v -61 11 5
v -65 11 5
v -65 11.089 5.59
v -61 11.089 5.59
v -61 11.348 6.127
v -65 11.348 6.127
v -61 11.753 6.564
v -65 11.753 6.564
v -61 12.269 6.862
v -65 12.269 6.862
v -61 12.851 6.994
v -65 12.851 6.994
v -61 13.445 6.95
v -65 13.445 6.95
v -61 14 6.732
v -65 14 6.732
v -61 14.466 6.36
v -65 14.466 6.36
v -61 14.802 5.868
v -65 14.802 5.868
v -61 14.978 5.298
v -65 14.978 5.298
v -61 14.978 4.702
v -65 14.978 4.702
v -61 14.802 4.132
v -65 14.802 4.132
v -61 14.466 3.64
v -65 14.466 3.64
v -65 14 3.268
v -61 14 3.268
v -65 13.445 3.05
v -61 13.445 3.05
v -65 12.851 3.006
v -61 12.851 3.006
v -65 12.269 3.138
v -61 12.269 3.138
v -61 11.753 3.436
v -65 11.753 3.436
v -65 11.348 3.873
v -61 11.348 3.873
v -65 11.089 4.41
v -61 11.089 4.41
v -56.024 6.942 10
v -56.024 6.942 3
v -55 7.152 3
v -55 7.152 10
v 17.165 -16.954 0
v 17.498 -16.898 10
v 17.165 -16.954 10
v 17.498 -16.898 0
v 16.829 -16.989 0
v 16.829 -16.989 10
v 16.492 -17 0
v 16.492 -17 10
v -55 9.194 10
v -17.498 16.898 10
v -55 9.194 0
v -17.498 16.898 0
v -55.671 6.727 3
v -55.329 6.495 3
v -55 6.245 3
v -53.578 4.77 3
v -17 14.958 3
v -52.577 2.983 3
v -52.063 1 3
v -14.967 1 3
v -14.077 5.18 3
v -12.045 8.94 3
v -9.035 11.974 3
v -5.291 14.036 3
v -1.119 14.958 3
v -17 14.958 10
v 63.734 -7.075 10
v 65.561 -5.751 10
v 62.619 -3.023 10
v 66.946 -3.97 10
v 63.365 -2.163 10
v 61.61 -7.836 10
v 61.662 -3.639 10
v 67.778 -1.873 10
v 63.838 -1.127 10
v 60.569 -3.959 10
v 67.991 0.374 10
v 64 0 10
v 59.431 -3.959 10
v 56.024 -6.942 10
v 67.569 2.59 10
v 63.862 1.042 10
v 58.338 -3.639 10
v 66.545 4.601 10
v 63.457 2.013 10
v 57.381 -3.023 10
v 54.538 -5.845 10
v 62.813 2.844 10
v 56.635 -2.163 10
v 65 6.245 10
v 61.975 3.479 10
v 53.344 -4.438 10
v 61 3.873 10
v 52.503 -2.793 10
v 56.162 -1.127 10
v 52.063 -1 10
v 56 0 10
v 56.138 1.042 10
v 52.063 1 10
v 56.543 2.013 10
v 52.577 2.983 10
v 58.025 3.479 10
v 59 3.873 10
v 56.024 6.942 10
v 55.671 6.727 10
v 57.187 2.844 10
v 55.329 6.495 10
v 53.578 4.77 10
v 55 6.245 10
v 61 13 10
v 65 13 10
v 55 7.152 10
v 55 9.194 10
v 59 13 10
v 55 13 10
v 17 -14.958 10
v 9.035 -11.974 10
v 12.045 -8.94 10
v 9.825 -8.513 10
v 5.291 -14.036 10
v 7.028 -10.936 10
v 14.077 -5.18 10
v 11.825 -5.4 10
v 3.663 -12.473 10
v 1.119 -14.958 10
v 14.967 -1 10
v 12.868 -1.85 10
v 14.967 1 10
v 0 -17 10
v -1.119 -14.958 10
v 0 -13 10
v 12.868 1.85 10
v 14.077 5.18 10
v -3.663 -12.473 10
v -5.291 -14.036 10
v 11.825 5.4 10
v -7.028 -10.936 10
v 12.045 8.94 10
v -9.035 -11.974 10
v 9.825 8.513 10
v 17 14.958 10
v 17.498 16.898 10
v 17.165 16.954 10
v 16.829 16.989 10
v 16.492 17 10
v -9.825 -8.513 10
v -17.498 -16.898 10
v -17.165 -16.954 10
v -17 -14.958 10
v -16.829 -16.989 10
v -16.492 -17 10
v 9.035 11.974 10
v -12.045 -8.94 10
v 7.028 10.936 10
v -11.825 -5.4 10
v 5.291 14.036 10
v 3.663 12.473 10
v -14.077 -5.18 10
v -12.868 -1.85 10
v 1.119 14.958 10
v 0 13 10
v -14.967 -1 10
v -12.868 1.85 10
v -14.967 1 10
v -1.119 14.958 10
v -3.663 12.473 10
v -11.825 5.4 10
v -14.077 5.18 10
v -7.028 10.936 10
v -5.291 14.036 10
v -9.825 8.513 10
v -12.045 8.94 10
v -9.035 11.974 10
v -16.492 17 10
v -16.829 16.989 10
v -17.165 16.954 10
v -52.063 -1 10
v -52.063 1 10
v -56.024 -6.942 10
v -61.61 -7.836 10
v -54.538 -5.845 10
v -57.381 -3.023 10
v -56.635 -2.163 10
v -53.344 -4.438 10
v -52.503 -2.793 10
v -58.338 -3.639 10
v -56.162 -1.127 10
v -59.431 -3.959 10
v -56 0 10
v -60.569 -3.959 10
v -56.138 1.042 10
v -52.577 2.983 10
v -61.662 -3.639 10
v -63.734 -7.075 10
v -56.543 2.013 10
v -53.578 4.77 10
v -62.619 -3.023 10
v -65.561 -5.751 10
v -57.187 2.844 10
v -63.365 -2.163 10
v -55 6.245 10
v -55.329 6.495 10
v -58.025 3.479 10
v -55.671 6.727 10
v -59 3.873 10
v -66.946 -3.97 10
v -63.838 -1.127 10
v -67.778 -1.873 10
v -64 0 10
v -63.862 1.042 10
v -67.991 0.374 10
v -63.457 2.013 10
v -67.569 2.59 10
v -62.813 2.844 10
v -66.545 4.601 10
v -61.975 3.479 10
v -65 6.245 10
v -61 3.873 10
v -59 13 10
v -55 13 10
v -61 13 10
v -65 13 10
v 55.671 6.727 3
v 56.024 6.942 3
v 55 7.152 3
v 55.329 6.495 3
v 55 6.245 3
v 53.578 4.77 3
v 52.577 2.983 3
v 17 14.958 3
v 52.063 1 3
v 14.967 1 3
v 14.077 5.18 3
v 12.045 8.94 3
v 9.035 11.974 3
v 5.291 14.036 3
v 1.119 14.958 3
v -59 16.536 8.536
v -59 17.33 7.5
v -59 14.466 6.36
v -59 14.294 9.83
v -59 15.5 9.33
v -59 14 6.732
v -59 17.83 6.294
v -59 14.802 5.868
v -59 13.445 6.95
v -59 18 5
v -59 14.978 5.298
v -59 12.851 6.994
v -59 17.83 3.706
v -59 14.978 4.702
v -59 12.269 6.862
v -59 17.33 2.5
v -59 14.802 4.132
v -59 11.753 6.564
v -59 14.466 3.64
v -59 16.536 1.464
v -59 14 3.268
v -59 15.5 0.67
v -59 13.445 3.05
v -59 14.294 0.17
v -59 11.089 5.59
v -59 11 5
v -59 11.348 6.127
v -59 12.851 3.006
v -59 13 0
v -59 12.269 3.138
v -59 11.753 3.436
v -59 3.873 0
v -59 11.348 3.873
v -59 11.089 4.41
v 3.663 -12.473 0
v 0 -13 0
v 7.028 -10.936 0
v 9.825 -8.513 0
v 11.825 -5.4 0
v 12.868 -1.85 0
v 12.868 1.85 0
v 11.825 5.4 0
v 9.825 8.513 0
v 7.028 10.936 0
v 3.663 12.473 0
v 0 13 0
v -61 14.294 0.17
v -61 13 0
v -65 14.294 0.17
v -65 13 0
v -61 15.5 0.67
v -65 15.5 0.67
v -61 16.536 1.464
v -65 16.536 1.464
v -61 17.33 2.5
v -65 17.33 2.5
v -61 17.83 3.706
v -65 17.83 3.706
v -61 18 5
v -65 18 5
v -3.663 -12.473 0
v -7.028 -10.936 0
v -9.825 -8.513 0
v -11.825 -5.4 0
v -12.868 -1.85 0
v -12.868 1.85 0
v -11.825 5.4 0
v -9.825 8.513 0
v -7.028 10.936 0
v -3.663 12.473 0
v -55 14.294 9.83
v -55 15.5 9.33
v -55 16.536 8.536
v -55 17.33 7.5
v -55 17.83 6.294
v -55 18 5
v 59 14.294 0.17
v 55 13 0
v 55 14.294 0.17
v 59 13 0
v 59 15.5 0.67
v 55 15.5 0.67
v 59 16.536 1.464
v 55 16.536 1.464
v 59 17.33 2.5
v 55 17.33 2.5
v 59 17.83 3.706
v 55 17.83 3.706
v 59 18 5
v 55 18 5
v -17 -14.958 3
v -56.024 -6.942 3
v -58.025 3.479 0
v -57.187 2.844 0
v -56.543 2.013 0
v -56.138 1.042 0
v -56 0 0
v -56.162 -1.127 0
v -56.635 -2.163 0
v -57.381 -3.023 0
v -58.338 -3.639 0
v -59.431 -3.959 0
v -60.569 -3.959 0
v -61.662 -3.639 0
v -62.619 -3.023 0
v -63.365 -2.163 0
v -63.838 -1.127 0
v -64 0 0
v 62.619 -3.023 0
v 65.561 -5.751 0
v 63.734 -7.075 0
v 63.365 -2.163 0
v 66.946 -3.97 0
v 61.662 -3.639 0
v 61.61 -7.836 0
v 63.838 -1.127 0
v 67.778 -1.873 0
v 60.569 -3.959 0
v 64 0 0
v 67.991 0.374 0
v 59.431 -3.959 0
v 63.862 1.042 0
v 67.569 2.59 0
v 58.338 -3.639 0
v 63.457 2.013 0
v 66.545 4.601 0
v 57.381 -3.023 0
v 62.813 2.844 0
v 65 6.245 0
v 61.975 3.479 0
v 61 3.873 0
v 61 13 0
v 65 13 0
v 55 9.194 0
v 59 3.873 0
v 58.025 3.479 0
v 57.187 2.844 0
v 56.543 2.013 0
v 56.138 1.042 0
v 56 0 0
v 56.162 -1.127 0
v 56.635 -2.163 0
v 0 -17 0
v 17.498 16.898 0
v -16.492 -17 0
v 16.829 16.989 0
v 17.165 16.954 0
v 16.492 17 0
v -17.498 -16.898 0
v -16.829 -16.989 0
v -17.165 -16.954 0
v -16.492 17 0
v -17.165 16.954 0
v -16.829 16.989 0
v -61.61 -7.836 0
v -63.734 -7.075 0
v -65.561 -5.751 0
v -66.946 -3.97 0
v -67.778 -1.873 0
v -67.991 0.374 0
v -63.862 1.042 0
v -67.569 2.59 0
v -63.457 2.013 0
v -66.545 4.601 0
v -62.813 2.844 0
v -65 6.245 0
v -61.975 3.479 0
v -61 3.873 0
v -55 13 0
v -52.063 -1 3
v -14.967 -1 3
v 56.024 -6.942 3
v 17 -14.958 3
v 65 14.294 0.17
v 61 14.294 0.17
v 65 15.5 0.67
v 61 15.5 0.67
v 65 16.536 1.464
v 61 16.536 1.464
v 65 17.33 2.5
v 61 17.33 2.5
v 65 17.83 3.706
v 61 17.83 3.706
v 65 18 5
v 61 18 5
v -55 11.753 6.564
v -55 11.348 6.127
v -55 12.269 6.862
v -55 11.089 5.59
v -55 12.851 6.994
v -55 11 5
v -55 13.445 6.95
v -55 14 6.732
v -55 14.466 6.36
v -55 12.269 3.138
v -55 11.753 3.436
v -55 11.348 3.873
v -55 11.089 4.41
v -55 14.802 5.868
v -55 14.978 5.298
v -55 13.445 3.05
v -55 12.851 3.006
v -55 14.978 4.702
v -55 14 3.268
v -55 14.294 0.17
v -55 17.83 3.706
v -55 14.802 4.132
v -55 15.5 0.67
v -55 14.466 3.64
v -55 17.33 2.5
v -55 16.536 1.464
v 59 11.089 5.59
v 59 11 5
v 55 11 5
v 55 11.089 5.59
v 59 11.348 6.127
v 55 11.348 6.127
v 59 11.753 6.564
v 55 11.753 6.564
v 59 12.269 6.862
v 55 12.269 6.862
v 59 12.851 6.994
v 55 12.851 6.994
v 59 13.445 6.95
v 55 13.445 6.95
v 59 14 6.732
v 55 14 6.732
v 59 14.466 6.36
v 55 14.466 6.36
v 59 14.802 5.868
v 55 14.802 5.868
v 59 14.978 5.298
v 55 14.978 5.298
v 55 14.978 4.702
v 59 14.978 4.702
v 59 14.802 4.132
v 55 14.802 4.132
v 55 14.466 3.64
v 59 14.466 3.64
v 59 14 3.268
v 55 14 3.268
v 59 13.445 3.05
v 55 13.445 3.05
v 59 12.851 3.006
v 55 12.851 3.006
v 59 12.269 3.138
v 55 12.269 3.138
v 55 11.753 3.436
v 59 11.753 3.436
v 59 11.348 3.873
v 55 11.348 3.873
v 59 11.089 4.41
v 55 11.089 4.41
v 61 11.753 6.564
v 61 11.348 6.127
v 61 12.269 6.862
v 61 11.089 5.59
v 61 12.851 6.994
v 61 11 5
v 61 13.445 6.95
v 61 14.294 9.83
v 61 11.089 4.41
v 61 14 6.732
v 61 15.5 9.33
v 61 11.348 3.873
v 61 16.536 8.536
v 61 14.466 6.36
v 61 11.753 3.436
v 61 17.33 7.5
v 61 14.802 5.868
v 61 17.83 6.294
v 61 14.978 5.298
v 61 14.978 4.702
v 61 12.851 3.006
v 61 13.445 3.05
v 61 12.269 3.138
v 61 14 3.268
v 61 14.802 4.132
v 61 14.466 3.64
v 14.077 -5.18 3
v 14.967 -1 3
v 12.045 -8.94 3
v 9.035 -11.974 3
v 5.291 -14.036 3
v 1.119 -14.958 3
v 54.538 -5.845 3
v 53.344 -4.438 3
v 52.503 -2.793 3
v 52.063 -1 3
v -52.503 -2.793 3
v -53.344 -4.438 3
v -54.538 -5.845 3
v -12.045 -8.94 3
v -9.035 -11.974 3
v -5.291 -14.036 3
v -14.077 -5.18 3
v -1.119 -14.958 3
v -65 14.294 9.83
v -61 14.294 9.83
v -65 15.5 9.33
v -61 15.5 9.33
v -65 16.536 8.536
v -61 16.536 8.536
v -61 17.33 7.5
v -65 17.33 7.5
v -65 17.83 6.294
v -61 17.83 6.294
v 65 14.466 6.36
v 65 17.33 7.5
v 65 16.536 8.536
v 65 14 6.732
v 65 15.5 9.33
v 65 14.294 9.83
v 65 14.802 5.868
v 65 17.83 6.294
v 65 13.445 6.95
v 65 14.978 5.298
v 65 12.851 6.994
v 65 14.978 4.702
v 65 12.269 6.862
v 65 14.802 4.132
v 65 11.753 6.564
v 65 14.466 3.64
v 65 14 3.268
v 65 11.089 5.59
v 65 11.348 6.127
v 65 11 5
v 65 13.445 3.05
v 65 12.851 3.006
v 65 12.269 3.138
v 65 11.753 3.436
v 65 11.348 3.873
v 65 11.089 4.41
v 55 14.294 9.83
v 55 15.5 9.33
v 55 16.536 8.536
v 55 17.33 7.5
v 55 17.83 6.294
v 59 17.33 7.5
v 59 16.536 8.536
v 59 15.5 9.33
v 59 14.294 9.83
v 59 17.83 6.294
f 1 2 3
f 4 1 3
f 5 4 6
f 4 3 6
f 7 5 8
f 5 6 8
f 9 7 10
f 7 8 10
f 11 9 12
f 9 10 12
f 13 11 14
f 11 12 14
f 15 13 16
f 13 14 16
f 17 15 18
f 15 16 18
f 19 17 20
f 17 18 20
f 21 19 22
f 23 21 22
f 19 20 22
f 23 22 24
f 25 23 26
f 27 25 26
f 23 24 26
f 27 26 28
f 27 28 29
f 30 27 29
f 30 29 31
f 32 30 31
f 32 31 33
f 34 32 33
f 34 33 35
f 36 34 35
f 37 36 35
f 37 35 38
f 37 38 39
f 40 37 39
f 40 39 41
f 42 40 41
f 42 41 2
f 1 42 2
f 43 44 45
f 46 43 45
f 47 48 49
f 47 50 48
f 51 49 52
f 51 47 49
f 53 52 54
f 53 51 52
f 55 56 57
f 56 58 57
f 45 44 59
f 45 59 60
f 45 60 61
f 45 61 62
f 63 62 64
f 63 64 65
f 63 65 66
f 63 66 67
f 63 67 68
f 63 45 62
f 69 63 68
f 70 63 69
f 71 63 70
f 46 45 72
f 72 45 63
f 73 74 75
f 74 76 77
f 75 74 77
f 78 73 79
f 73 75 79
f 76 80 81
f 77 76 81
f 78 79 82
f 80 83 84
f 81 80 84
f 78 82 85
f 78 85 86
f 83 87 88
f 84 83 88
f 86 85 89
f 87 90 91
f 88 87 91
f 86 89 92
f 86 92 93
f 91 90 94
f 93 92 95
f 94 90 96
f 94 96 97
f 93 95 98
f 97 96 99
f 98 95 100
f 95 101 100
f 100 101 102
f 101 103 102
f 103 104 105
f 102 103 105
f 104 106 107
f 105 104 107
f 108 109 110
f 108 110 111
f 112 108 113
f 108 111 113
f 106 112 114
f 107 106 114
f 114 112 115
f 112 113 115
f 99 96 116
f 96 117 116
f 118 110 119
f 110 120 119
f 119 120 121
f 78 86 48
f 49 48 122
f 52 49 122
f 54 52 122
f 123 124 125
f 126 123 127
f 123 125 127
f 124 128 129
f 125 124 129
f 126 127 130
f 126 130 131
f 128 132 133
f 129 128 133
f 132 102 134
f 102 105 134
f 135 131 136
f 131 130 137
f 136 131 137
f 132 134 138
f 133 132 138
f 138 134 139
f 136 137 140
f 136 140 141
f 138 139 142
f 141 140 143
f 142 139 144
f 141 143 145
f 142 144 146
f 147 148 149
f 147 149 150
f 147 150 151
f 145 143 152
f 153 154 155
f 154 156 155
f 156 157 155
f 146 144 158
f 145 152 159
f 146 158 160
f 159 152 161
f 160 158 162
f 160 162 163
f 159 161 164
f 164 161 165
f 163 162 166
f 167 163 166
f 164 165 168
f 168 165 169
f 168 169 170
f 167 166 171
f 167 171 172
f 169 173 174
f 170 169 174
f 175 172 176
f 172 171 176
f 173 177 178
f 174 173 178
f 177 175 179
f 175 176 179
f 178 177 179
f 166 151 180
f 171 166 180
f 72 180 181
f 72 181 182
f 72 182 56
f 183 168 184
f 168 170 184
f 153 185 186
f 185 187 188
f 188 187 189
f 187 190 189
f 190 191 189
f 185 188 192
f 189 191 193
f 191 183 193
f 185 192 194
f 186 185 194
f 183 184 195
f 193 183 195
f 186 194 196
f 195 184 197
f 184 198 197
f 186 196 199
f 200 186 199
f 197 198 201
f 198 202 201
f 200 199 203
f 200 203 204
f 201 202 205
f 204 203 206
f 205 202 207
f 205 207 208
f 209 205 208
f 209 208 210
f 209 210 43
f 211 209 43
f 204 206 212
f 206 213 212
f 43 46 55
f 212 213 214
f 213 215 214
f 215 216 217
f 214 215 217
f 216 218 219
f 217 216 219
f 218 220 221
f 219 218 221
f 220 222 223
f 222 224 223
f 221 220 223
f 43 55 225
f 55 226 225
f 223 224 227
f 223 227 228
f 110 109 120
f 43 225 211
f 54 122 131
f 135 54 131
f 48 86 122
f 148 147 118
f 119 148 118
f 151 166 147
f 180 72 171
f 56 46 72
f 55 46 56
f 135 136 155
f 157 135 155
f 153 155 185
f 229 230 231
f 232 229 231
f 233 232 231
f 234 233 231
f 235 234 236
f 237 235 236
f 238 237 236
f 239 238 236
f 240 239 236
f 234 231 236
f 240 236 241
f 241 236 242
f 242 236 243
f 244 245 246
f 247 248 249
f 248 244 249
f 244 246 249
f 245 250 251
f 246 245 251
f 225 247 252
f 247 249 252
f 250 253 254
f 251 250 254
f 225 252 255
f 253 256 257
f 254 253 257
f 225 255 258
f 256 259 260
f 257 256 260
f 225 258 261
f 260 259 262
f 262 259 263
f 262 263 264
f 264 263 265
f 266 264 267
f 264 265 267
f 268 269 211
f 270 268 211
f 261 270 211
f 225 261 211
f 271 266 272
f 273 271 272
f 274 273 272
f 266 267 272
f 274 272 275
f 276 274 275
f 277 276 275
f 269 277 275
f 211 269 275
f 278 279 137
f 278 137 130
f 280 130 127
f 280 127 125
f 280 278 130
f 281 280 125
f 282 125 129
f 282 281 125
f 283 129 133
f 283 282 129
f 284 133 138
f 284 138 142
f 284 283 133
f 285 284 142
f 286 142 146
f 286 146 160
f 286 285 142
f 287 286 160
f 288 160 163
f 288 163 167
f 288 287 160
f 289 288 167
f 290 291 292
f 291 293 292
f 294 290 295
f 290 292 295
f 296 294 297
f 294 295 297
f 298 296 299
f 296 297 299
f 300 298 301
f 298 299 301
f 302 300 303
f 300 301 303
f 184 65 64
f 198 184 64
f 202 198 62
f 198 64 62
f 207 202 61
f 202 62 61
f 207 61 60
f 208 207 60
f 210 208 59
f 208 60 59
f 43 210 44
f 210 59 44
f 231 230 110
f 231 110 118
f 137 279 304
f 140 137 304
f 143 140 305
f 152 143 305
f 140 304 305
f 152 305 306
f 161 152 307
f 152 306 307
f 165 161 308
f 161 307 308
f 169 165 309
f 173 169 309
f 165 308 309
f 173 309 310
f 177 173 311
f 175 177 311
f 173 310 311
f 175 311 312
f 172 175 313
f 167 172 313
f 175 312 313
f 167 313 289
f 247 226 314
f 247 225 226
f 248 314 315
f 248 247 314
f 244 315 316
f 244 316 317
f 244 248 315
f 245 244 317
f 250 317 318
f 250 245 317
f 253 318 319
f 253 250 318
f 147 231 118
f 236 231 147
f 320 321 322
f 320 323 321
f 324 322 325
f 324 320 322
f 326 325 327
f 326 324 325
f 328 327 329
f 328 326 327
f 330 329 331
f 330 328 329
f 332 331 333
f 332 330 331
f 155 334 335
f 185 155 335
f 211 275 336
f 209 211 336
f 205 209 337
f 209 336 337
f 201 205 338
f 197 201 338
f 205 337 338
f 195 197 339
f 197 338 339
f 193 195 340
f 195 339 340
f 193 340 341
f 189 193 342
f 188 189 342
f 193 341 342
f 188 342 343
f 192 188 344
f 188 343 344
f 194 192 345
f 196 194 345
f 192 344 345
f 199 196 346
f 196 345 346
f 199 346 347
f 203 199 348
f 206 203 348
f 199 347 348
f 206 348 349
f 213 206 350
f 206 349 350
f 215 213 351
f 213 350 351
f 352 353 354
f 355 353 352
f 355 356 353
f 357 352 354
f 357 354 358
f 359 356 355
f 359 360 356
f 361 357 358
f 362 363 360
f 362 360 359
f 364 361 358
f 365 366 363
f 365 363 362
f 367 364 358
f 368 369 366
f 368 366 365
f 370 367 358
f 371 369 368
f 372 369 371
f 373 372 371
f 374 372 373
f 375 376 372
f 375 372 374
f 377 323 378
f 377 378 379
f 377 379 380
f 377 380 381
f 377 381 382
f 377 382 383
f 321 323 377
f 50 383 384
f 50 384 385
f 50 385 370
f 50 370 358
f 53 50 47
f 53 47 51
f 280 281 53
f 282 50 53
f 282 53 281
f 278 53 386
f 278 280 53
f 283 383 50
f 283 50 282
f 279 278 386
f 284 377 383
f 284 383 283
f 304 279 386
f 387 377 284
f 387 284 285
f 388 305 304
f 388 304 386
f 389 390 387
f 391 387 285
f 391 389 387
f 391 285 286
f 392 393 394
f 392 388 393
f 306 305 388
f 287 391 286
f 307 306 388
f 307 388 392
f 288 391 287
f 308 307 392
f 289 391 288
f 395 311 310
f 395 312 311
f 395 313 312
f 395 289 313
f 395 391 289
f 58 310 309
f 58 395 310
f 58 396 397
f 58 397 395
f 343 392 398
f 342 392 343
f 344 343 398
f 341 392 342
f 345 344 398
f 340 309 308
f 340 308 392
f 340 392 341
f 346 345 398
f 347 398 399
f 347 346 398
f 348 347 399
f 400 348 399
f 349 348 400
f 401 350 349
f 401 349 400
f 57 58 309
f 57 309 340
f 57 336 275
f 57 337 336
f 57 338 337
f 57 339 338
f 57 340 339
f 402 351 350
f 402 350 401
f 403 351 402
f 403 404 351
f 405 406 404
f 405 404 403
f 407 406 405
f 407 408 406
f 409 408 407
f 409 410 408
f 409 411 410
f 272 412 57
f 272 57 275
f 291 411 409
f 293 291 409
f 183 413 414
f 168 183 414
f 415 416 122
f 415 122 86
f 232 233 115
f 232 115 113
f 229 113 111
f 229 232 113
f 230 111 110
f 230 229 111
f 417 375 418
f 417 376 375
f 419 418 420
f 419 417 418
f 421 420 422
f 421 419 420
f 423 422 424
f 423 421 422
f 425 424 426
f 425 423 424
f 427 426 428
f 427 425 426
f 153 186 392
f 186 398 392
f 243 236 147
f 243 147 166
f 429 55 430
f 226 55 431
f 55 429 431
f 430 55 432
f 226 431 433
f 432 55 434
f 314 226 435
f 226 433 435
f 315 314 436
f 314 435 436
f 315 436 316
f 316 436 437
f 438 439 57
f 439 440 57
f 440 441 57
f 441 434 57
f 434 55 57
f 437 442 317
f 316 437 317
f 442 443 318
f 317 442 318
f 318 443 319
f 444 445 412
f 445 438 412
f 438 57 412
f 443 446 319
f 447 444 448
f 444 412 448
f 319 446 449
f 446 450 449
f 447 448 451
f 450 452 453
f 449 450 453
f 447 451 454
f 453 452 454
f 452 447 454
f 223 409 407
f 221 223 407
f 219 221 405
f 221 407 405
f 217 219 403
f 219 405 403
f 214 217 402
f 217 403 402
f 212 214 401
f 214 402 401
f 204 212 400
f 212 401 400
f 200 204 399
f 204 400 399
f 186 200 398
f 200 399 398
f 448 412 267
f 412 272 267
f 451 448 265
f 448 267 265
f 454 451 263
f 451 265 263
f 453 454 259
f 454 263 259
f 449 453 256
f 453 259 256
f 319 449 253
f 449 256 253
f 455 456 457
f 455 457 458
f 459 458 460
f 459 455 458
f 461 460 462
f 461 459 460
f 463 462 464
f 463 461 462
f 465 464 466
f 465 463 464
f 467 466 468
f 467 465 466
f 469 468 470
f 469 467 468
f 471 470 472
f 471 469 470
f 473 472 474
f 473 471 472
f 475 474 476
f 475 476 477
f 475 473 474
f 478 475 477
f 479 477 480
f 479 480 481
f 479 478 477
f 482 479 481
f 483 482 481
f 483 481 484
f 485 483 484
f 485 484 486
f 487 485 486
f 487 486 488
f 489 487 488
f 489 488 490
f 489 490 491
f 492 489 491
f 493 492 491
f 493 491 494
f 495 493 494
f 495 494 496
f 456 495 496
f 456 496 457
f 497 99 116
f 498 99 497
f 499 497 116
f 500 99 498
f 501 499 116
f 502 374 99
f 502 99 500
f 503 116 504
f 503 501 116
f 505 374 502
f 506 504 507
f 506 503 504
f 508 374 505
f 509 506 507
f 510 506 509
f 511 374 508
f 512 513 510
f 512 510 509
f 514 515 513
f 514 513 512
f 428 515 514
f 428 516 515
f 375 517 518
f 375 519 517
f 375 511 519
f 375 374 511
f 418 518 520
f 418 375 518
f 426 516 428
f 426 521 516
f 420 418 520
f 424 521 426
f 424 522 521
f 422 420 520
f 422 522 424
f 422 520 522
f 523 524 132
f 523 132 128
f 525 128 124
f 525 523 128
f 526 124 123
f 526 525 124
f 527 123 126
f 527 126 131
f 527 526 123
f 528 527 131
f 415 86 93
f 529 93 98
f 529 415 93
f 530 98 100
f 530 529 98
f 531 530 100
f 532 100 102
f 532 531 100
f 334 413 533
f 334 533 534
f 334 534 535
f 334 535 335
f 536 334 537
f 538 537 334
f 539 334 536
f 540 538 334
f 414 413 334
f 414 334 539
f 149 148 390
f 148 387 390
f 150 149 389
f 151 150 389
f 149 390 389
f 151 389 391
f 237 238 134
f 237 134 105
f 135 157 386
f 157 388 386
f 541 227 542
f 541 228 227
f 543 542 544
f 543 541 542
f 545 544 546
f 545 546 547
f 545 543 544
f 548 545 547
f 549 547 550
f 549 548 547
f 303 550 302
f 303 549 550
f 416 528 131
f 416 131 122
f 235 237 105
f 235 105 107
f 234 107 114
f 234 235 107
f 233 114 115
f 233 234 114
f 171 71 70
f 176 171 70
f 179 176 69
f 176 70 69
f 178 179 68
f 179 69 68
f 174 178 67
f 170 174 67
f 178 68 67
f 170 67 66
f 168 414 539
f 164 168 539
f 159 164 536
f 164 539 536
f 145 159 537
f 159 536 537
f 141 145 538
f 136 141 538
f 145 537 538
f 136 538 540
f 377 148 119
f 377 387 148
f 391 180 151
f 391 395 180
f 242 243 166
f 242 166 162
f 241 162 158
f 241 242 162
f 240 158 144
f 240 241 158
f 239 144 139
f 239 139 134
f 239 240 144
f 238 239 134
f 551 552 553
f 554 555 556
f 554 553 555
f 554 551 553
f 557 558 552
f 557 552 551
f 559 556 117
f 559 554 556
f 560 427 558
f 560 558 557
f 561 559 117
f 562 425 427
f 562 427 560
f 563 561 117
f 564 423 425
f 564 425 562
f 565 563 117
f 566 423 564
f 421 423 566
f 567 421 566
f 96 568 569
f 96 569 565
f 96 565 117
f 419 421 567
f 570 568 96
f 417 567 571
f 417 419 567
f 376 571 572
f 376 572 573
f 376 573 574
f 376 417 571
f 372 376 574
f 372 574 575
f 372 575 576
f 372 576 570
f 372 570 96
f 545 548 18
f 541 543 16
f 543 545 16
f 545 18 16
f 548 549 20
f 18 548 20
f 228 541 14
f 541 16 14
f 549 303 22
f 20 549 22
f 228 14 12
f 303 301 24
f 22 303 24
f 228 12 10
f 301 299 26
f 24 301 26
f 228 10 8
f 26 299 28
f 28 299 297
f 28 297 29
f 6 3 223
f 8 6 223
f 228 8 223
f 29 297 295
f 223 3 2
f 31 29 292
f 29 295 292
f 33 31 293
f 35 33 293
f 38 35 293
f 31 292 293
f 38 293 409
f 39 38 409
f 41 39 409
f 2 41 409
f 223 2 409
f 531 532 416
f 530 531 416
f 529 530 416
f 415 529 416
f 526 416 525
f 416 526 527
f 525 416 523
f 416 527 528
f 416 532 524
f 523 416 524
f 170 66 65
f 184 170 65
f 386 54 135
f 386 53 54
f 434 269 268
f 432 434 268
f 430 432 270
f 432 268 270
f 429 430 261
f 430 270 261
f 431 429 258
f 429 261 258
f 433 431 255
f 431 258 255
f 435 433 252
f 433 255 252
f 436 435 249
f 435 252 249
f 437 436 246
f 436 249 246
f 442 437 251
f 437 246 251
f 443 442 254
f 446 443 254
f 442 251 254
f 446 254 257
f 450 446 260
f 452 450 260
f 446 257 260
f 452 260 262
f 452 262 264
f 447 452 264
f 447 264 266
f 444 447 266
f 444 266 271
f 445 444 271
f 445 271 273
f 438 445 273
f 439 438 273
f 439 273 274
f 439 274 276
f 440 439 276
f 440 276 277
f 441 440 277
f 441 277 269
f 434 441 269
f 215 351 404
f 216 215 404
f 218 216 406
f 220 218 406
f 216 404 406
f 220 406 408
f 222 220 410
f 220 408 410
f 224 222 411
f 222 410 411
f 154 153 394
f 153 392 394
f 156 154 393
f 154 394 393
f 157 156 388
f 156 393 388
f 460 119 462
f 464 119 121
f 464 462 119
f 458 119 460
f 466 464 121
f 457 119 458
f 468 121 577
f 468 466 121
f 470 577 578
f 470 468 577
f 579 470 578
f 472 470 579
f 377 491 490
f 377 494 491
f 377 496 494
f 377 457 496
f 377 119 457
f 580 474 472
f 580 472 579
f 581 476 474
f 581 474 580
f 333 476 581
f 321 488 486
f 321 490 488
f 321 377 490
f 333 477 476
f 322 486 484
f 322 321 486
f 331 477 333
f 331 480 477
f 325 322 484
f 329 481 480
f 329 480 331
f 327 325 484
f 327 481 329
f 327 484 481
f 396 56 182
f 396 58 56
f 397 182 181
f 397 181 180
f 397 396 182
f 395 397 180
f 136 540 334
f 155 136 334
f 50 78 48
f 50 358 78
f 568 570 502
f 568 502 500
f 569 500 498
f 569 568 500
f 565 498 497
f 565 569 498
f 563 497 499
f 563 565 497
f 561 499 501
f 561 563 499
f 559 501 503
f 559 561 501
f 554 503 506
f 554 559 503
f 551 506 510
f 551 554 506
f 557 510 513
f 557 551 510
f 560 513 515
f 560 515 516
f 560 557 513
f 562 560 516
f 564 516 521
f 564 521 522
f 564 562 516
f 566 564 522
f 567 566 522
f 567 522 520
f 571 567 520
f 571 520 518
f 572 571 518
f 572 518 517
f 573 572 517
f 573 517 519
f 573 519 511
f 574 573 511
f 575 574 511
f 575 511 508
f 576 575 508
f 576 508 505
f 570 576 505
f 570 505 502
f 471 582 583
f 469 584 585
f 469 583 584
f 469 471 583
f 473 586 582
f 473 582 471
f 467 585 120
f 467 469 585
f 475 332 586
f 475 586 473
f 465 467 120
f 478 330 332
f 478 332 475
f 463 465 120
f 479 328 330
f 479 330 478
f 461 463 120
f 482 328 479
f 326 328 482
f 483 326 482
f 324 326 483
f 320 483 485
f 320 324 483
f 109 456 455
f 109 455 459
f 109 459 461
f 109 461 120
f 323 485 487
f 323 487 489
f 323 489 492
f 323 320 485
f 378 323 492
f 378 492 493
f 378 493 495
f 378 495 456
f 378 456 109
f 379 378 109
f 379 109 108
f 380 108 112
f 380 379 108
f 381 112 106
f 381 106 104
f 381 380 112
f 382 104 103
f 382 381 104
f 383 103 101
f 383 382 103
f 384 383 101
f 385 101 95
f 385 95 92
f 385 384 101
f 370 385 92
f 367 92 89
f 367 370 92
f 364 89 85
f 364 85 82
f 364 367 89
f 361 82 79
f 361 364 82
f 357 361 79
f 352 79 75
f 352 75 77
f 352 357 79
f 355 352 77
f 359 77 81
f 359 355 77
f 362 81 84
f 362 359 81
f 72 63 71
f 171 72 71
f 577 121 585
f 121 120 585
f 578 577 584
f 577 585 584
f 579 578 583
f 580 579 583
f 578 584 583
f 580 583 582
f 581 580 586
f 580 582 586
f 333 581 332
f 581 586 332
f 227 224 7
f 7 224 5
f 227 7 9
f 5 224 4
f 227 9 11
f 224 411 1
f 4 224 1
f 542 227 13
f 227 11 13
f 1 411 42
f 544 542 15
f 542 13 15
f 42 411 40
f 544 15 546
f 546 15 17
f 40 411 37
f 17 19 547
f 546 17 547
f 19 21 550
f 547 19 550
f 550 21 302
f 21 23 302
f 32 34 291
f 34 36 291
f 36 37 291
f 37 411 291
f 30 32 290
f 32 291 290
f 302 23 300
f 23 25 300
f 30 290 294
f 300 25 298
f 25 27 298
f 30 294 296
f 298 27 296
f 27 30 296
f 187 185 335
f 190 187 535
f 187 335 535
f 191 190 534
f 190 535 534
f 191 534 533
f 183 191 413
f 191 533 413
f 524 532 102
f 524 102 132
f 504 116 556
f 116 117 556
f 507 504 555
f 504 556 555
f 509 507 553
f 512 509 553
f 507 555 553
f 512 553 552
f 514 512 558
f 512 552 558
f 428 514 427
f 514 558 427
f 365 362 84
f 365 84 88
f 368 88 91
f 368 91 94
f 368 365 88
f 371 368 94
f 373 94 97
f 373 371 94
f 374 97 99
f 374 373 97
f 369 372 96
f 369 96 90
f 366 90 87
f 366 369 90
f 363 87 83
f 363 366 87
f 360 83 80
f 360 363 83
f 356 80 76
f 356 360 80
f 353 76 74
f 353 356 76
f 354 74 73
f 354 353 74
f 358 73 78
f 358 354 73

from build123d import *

# Parameters (mm, degrees)
F1_DEPTH = 3
F2_DEPTH = 10
F3_R     = 2
F4_DEPTH = 12
F5_R     = 4.99999


# Not quite as in the source:
# - a fillet or chamfer is up to 0.001 mm smaller than in the source, because OpenCascade refuses the exact size


with BuildPart() as f1:
    # F0 (on Top) → F1 (new body)
    with BuildSketch(Plane.XY):
        Polygon((-59, 8.3724593218), (-55, 9.1941298626), (-55, 18), (-59, 18), align=None)
        with BuildLine():
            Line((-56.0240224388, 6.9420171732), (-55, 7.1523694409))
            Line((-55, 7.1523694409), (-55, 9.1941298626))
            Line((-55, 9.1941298626), (-59, 8.3724593218))
            Line((-59, 8.3724593218), (-59, 7.9372539332))
            ThreePointArc((-59, 7.9372539332), (-57.4627352868, 7.5869814667), (-56.0240224388, 6.9420171732))
        make_face()
        with BuildLine():
            Line((-55, 0), (-55, 6.2449979984))
            ThreePointArc((-55, 6.2449979984), (-55.4985000025, 6.6133575264), (-56.0240224388, 6.9420171732))
            ThreePointArc((-56.0240224388, 6.9420171732), (-57.4627352868, 7.5869814667), (-59, 7.9372539332))
            Line((-59, 7.9372539332), (-59, 3.8729833462))
            ThreePointArc((-59, 3.8729833462), (-56.8377223398, 2.4494897428), (-56, 0))
            Line((-56, 0), (-55, 0))
        make_face()
        with BuildLine():
            ThreePointArc((-61.6097295884, 7.8363748412), (-63.3993016006, 7.2418746626), (-65, 6.2449979984))
            Line((-65, 6.2449979984), (-65, 0))
            Line((-65, 0), (-64, 0))
            ThreePointArc((-64, 0), (-63.1622776602, 2.4494897428), (-61, 3.8729833462))
            Line((-61, 3.8729833462), (-61, 7.9372539332))
            ThreePointArc((-61, 7.9372539332), (-61.3058393006, 7.8927044618), (-61.6097295884, 7.8363748412))
        make_face()
        with BuildLine():
            Line((-65, 18), (-65, 6.2449979984))
            ThreePointArc((-65, 6.2449979984), (-63.3993016006, 7.2418746626), (-61.6097295884, 7.8363748412))
            Line((-61.6097295884, 7.8363748412), (-61, 7.9616240514))
            Line((-61, 7.9616240514), (-61, 18))
            Line((-61, 18), (-65, 18))
        make_face()
        with BuildLine():
            ThreePointArc((-61.6097295884, -7.8363748412), (-58.7351872562, -7.8993828065), (-56.0240224388, -6.9420171732))
            ThreePointArc((-56.0240224388, -6.9420171732), (-53.3435622754, -4.4375485145), (-52.0627460668, -1))
            ThreePointArc((-52.0627460668, -1), (-52.0157019261, -0.5009833003), (-52, 0))
            ThreePointArc((-52, 0), (-52.0157019261, 0.5009833003), (-52.0627460668, 1))
            ThreePointArc((-52.0627460668, 1), (-53.0199831065, 3.9088827261), (-55, 6.2449979984))
            Line((-55, 6.2449979984), (-55, 0))
            Line((-55, 0), (-56, 0))
            ThreePointArc((-56, 0), (-60, -4), (-64, 0))
            Line((-64, 0), (-65, 0))
            Line((-65, 0), (-65, 6.2449979984))
            ThreePointArc((-65, 6.2449979984), (-67.7777500969, -1.8725927026), (-61.6097295884, -7.8363748412))
        make_face()
        with BuildLine():
            Line((-56.0240224388, -6.9420171732), (-17, -14.9582395784))
            Line((-17, -14.9582395784), (-17, -1))
            Line((-17, -1), (-52.0627460668, -1))
            ThreePointArc((-52.0627460668, -1), (-53.3435622754, -4.4375485145), (-56.0240224388, -6.9420171732))
        make_face()
        with BuildLine():
            Line((-17, 1), (-17, 14.9582395784))
            Line((-17, 14.9582395784), (-55, 7.1523694409))
            Line((-55, 7.1523694409), (-55, 6.2449979984))
            ThreePointArc((-55, 6.2449979984), (-53.0199831065, 3.9088827261), (-52.0627460668, 1))
            Line((-52.0627460668, 1), (-17, 1))
        make_face()
        Polygon((-55, 7.1523694409), (-17, 14.9582395784), (-17, 17), (-55, 9.1941298626), align=None)
        with BuildLine():
            Line((-17, -1), (-17, 1))
            Line((-17, 1), (-52.0627460668, 1))
            ThreePointArc((-52.0627460668, 1), (-52.0157019261, 0.5009833003), (-52, 0))
            ThreePointArc((-52, 0), (-52.0157019261, -0.5009833003), (-52.0627460668, -1))
            Line((-52.0627460668, -1), (-17, -1))
        make_face()
        with BuildLine():
            Line((-17, -17), (-17, -14.9582395784))
            Line((-17, -14.9582395784), (-56.0240224388, -6.9420171732))
            ThreePointArc((-56.0240224388, -6.9420171732), (-58.7351872562, -7.8993828065), (-61.6097295884, -7.8363748412))
            Line((-61.6097295884, -7.8363748412), (-17, -17))
        make_face()
        with BuildLine():
            Line((0, -17), (0, -15))
            ThreePointArc((0, -15), (-0.5596455685, -14.9895562589), (-1.1185118312, -14.9582395784))
            Line((-1.1185118312, -14.9582395784), (-17, -14.9582395784))
            Line((-17, -14.9582395784), (-17, -17))
            Line((-17, -17), (0, -17))
        make_face()
        with BuildLine():
            Line((0, -15), (0, -14.9582395784))
            Line((0, -14.9582395784), (-1.1185118312, -14.9582395784))
            ThreePointArc((-1.1185118312, -14.9582395784), (-0.5596455685, -14.9895562589), (0, -15))
        make_face()
        with BuildLine():
            Line((-17, -14.9582395784), (-1.1185118312, -14.9582395784))
            ThreePointArc((-1.1185118312, -14.9582395784), (-10.6485236686, -10.5645134142), (-14.9666295471, -1))
            Line((-14.9666295471, -1), (-17, -1))
            Line((-17, -1), (-17, -14.9582395784))
        make_face()
        with BuildLine():
            ThreePointArc((0, -13), (-13, 0), (0, 13))
            Line((0, 13), (0, 14.9582395784))
            Line((0, 14.9582395784), (-1.1185118312, 14.9582395784))
            ThreePointArc((-1.1185118312, 14.9582395784), (-10.6485236686, 10.5645134142), (-14.9666295471, 1))
            ThreePointArc((-14.9666295471, 1), (-15, 0), (-14.9666295471, -1))
            ThreePointArc((-14.9666295471, -1), (-10.6485236686, -10.5645134142), (-1.1185118312, -14.9582395784))
            Line((-1.1185118312, -14.9582395784), (0, -14.9582395784))
            Line((0, -14.9582395784), (0, -13))
        make_face()
        with BuildLine():
            ThreePointArc((-14.9666295471, -1), (-15, 0), (-14.9666295471, 1))
            Line((-14.9666295471, 1), (-17, 1))
            Line((-17, 1), (-17, -1))
            Line((-17, -1), (-14.9666295471, -1))
        make_face()
        with BuildLine():
            ThreePointArc((-14.9666295471, 1), (-10.6485236686, 10.5645134142), (-1.1185118312, 14.9582395784))
            Line((-1.1185118312, 14.9582395784), (-17, 14.9582395784))
            Line((-17, 14.9582395784), (-17, 1))
            Line((-17, 1), (-14.9666295471, 1))
        make_face()
        with BuildLine():
            ThreePointArc((-1.1185118312, 14.9582395784), (-0.5596455685, 14.9895562589), (0, 15))
            Line((0, 15), (0, 17))
            Line((0, 17), (-17, 17))
            Line((-17, 17), (-17, 14.9582395784))
            Line((-17, 14.9582395784), (-1.1185118312, 14.9582395784))
        make_face()
        with BuildLine():
            Line((-1.1185118312, 14.9582395784), (0, 14.9582395784))
            Line((0, 14.9582395784), (0, 15))
            ThreePointArc((0, 15), (-0.5596455685, 14.9895562589), (-1.1185118312, 14.9582395784))
        make_face()
        with BuildLine():
            Line((-55, 6.2449979984), (-55, 7.1523694409))
            Line((-55, 7.1523694409), (-56.0240224388, 6.9420171732))
            ThreePointArc((-56.0240224388, 6.9420171732), (-55.4985000025, 6.6133575264), (-55, 6.2449979984))
        make_face()
    extrude(amount=F1_DEPTH)

    # F0 (on Top) → F2 (join)
    with BuildSketch(Plane.XY):
        with BuildLine():
            Line((0, -17), (0, -15))
            ThreePointArc((0, -15), (-0.5596455685, -14.9895562589), (-1.1185118312, -14.9582395784))
            Line((-1.1185118312, -14.9582395784), (-17, -14.9582395784))
            Line((-17, -14.9582395784), (-17, -17))
            Line((-17, -17), (0, -17))
        make_face()
        with BuildLine():
            Line((0, -15), (0, -14.9582395784))
            Line((0, -14.9582395784), (-1.1185118312, -14.9582395784))
            ThreePointArc((-1.1185118312, -14.9582395784), (-0.5596455685, -14.9895562589), (0, -15))
        make_face()
        with BuildLine():
            Line((-17, -17), (-17, -14.9582395784))
            Line((-17, -14.9582395784), (-56.0240224388, -6.9420171732))
            ThreePointArc((-56.0240224388, -6.9420171732), (-58.7351872562, -7.8993828065), (-61.6097295884, -7.8363748412))
            Line((-61.6097295884, -7.8363748412), (-17, -17))
        make_face()
        with BuildLine():
            ThreePointArc((0, -13), (-13, 0), (0, 13))
            Line((0, 13), (0, 14.9582395784))
            Line((0, 14.9582395784), (-1.1185118312, 14.9582395784))
            ThreePointArc((-1.1185118312, 14.9582395784), (-10.6485236686, 10.5645134142), (-14.9666295471, 1))
            ThreePointArc((-14.9666295471, 1), (-15, 0), (-14.9666295471, -1))
            ThreePointArc((-14.9666295471, -1), (-10.6485236686, -10.5645134142), (-1.1185118312, -14.9582395784))
            Line((-1.1185118312, -14.9582395784), (0, -14.9582395784))
            Line((0, -14.9582395784), (0, -13))
        make_face()
        with BuildLine():
            ThreePointArc((-1.1185118312, 14.9582395784), (-0.5596455685, 14.9895562589), (0, 15))
            Line((0, 15), (0, 17))
            Line((0, 17), (-17, 17))
            Line((-17, 17), (-17, 14.9582395784))
            Line((-17, 14.9582395784), (-1.1185118312, 14.9582395784))
        make_face()
        with BuildLine():
            Line((-1.1185118312, 14.9582395784), (0, 14.9582395784))
            Line((0, 14.9582395784), (0, 15))
            ThreePointArc((0, 15), (-0.5596455685, 14.9895562589), (-1.1185118312, 14.9582395784))
        make_face()
        Polygon((-55, 7.1523694409), (-17, 14.9582395784), (-17, 17), (-55, 9.1941298626), align=None)
        with BuildLine():
            Line((-56.0240224388, 6.9420171732), (-55, 7.1523694409))
            Line((-55, 7.1523694409), (-55, 9.1941298626))
            Line((-55, 9.1941298626), (-59, 8.3724593218))
            Line((-59, 8.3724593218), (-59, 7.9372539332))
            ThreePointArc((-59, 7.9372539332), (-57.4627352868, 7.5869814667), (-56.0240224388, 6.9420171732))
        make_face()
        with BuildLine():
            ThreePointArc((-61.6097295884, -7.8363748412), (-58.7351872562, -7.8993828065), (-56.0240224388, -6.9420171732))
            ThreePointArc((-56.0240224388, -6.9420171732), (-53.3435622754, -4.4375485145), (-52.0627460668, -1))
            ThreePointArc((-52.0627460668, -1), (-52.0157019261, -0.5009833003), (-52, 0))
            ThreePointArc((-52, 0), (-52.0157019261, 0.5009833003), (-52.0627460668, 1))
            ThreePointArc((-52.0627460668, 1), (-53.0199831065, 3.9088827261), (-55, 6.2449979984))
            Line((-55, 6.2449979984), (-55, 0))
            Line((-55, 0), (-56, 0))
            ThreePointArc((-56, 0), (-60, -4), (-64, 0))
            Line((-64, 0), (-65, 0))
            Line((-65, 0), (-65, 6.2449979984))
            ThreePointArc((-65, 6.2449979984), (-67.7777500969, -1.8725927026), (-61.6097295884, -7.8363748412))
        make_face()
        with BuildLine():
            Line((-55, 0), (-55, 6.2449979984))
            ThreePointArc((-55, 6.2449979984), (-55.4985000025, 6.6133575264), (-56.0240224388, 6.9420171732))
            ThreePointArc((-56.0240224388, 6.9420171732), (-57.4627352868, 7.5869814667), (-59, 7.9372539332))
            Line((-59, 7.9372539332), (-59, 3.8729833462))
            ThreePointArc((-59, 3.8729833462), (-56.8377223398, 2.4494897428), (-56, 0))
            Line((-56, 0), (-55, 0))
        make_face()
        with BuildLine():
            ThreePointArc((-61.6097295884, 7.8363748412), (-63.3993016006, 7.2418746626), (-65, 6.2449979984))
            Line((-65, 6.2449979984), (-65, 0))
            Line((-65, 0), (-64, 0))
            ThreePointArc((-64, 0), (-63.1622776602, 2.4494897428), (-61, 3.8729833462))
            Line((-61, 3.8729833462), (-61, 7.9372539332))
            ThreePointArc((-61, 7.9372539332), (-61.3058393006, 7.8927044618), (-61.6097295884, 7.8363748412))
        make_face()
        with BuildLine():
            Line((-65, 18), (-65, 6.2449979984))
            ThreePointArc((-65, 6.2449979984), (-63.3993016006, 7.2418746626), (-61.6097295884, 7.8363748412))
            Line((-61.6097295884, 7.8363748412), (-61, 7.9616240514))
            Line((-61, 7.9616240514), (-61, 18))
            Line((-61, 18), (-65, 18))
        make_face()
        Polygon((-59, 8.3724593218), (-55, 9.1941298626), (-55, 18), (-59, 18), align=None)
        with BuildLine():
            Line((-17, -1), (-17, 1))
            Line((-17, 1), (-52.0627460668, 1))
            ThreePointArc((-52.0627460668, 1), (-52.0157019261, 0.5009833003), (-52, 0))
            ThreePointArc((-52, 0), (-52.0157019261, -0.5009833003), (-52.0627460668, -1))
            Line((-52.0627460668, -1), (-17, -1))
        make_face()
        with BuildLine():
            ThreePointArc((-14.9666295471, -1), (-15, 0), (-14.9666295471, 1))
            Line((-14.9666295471, 1), (-17, 1))
            Line((-17, 1), (-17, -1))
            Line((-17, -1), (-14.9666295471, -1))
        make_face()
        with BuildLine():
            Line((-61, 7.9372539332), (-61, 7.9616240514))
            Line((-61, 7.9616240514), (-61.6097295884, 7.8363748412))
            ThreePointArc((-61.6097295884, 7.8363748412), (-61.3058393006, 7.8927044618), (-61, 7.9372539332))
        make_face()
    extrude(amount=F2_DEPTH)

    # F3 (on face) → F4 (cut)
    with BuildSketch(Plane(origin=(-65, 0, 0), x_dir=(0, -1, 0), z_dir=(-1, 0, 0))):
        with Locations((-13, 5)):
            Circle(F3_R)
    extrude(amount=-F4_DEPTH, mode=Mode.SUBTRACT)

    # F5 (radius 5 in the source; OpenCascade refuses exactly that, so slightly less here)
    f5_edges = [f1.edges().sort_by_distance(p)[0] for p in [
        (-63, 18, 0),
        (-57, 18, 0),
        (-57, 18, 10),
        (-63, 18, 10),
        (-17, 17, 5),
        (-17, -17, 5),
    ]]
    fillet(f5_edges, radius=F5_R)

    # F6: F1 across face


with BuildPart() as f1_1:
    add(f1.part)
    add(f1.part.mirror(Plane(origin=(0, -15, 5), x_dir=(0, 1, 0), z_dir=(1, 0, 0))))


solid = f1_1.part
